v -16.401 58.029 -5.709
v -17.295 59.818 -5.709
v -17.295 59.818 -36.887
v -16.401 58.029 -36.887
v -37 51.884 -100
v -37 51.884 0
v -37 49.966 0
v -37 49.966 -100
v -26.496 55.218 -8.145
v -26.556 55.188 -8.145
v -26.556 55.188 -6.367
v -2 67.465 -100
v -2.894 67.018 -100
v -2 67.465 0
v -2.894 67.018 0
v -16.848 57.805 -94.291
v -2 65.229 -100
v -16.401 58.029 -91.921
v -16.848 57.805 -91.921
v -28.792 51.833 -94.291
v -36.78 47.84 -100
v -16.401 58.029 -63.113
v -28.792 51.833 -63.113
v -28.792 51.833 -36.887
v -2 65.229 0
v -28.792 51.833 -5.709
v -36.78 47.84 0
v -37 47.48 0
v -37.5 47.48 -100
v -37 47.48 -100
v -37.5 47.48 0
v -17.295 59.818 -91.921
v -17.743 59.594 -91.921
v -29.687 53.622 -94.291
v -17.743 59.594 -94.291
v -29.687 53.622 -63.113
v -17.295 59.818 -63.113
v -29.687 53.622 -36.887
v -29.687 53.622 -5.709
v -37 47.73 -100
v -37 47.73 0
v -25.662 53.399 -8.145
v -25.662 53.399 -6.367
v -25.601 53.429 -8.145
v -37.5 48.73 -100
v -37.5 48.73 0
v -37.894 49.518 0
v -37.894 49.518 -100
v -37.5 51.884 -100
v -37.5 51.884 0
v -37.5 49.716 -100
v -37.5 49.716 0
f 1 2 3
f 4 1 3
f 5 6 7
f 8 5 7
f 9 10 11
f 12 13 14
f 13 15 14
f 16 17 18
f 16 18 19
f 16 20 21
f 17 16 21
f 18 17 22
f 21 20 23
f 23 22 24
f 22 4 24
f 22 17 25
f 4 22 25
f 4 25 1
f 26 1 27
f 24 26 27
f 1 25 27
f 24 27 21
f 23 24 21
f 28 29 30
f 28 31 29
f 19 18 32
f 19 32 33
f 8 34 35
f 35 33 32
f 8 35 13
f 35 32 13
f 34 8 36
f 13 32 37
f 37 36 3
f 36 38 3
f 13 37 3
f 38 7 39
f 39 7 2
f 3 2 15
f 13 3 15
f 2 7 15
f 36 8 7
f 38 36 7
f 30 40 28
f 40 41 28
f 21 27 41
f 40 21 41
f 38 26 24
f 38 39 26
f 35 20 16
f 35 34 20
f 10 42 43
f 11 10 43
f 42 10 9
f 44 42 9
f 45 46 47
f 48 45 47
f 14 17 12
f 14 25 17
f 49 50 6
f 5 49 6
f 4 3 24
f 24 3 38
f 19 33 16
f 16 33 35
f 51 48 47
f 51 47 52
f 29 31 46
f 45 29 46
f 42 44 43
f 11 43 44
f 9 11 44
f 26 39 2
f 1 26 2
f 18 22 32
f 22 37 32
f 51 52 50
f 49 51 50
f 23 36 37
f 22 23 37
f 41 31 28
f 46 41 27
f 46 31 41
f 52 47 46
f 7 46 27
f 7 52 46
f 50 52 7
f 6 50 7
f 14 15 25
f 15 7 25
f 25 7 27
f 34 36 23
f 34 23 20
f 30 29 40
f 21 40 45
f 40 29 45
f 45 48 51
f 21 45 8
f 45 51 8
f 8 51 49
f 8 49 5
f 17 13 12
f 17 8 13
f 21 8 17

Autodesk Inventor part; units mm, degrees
ref_plane "YZ Plane" through (0, 0, 0) normal (1, 0, 0) x (0, 1, 0)
ref_plane "XZ Plane" through (0, 0, 0) normal (0, 1, 0) x (-1, 0, 0)
ref_plane "XY Plane" through (0, 0, 0) normal (0, 0, 1) x (1, 0, 0)
ref_plane "Work Plane1" through (0, 0, 0) normal (0, 0, 1) x (1, 0, 0)
sketch "Sketch1" plane through (0, 0, 0) normal (0, 0, 1) x (1, 0, 0)
  arc A0 (-37, -19.9971) -> (-36.2161, -20.9735) centre (-36, -19.9971) ccw projected
  line L0 (-36.2161, -20.9735) -> (-23.4006, -23.8092) projected
  arc A1 (-23.4006, -23.8092) -> (-22.2674, -22.4343) centre (-23.1845, -22.8329) ccw projected
  arc A2 (-15.124, -1.2705) -> (-22.2674, -22.4343) centre (-7, -15.8) ccw projected
  arc A3 (-2, 0) -> (-15.124, -1.2705) centre (-7, -16.7705) ccw projected
  line L1 (-2, 0) -> (-2, 61.9933) projected
  arc A4 (-2, 61.9933) -> (-4.8944, 63.7822) centre (-4, 61.9933) ccw projected
  line L2 (-5.7149, 25.9193) -> (-9.7149, 25.9193) projected
  line L3 (-9.7149, 25.9193) -> (-9.7149, 32.3193) projected
  line L4 (-9.7149, 32.3193) -> (-5.7149, 32.3193) projected
  line L5 (-5.7149, 32.3193) -> (-5.7149, 25.9193) projected
  line L6 (0, 0) -> (0, 66.5) projected
  line L7 (-2, 0) -> (-2, 66.5) projected
  line L8 (0, 0) -> (-2, 0) projected
  line L9 (-2, 65.2294) -> (-36.7798, 47.8397)
  line L10 (-2, 65.2294) -> (-2.8944, 67.0182)
  line L11 (-37, 24.9335) -> (-37.5, 24.9335)
  line L12 (-37.5, 24.9335) -> (-37.5, 47.4795)
  line L13 (-37.5, 47.4795) -> (-37, 47.4795)
  line L14 (-37, 47.4795) -> (-37, 24.9335)
  line L15 (-37, 47.4795) -> (-37.5, 47.4795)
  line L16 (-37.5, 47.4795) -> (-37.5, 51.8841)
  line L17 (-37.5, 51.8841) -> (-37, 51.8841)
  line L18 (-37, 51.8841) -> (-37, 47.4795)
  line L19 (-36.7798, 47.8397) -> (-39.9927, 46.2332)
  line L20 (-37, 47.7295) -> (-37.8944, 49.5184)
  line L21 (-37.8944, 49.5184) -> (-2.8944, 67.0182)
  line L22 (-37, 47.7295) -> (-37, 49.9656)
  line L23 (-2, 65.2294) -> (-2, 67.4654)
  line L24 (-2.8944, 67.0182) -> (-2, 67.4654)
  line L25 (-37, 46.6115) -> (-37, -19.9971) projected
  line L26 (0, 66.5) -> (-2, 66.5) projected
  line L27 (-4.8944, 63.7822) -> (-37, 46.6115) projected
  point P0 (-37, 47.0432)
  point P1 (-37.5, 49.7156)
  point P2 (-37.5, 48.7296)
  dimension "d0" = 2
  dimension "d1" = 0.5
  dimension "d2" = 2
extrude "Extrusion1" add sketch "Sketch1" against normal blind 100 contours L19 L18 L13 | L16 L20 L19 | L9 L19 L18 L21 L10 | L20 L21 L16 | L16 L21 L18 L20 | L10 L24 L23 L7 | L16 L17 L18 L21
sketch "Sketch2" plane through (-2, 67.4654, 0) normal (-0.4472, 0.8944, 0) x (0.8944, 0.4472, 0)
  line L0 (-21.6579, 7.5484) -> (-21.306, 16.8472) projected
  line L1 (-20.8996, 27.5881) -> (-20.5477, 36.8868) projected
  line L2 (-20.5477, 36.8868) -> (-23.0666, 36.8868) projected
  line L3 (-29.9704, 36.8868) -> (-32.4893, 36.8868) projected
  line L4 (-33.5995, 7.5484) -> (-32.4893, 36.8868) projected
  line L5 (-21.8658, 16.8472) -> (-22.195, 8.1452) projected
  line L6 (-21.306, 16.8472) -> (-21.8658, 16.8472) projected
  line L7 (-21.6579, 7.5484) -> (-21.306, 16.8472) projected
  line L8 (-21.6579, 7.5484) -> (-24.1768, 7.5484) projected
  line L9 (-24.1768, 7.5484) -> (-24.316, 3.8687) projected
  ellipse E0 centre (-27.7679, 3.8687) end of major axis (-28.8048, 0.317) minor radius 3.433 (-31.2198, 3.8687) -> (-24.316, 3.8687) ccw projected
  line L10 (-31.0806, 7.5484) -> (-31.2198, 3.8687) projected
  line L11 (-31.0806, 7.5484) -> (-33.5995, 7.5484) projected
  line L12 (-33.5995, 7.5484) -> (-32.4893, 36.8868) projected
  line L13 (-29.9704, 36.8868) -> (-32.4893, 36.8868) projected
  line L14 (-29.9704, 36.8868) -> (-29.8312, 40.5666) projected
  ellipse E1 centre (-26.3793, 40.5666) end of major axis (-27.4161, 37.0148) minor radius 3.433 (-22.9274, 40.5666) -> (-29.8312, 40.5666) ccw projected
  line L15 (-23.0666, 36.8868) -> (-22.9274, 40.5666) projected
  line L16 (-20.5477, 36.8868) -> (-23.0666, 36.8868) projected
  line L17 (-20.8996, 27.5881) -> (-20.5477, 36.8868) projected
  line L18 (-21.4593, 27.5881) -> (-20.8996, 27.5881) projected
  line L19 (-21.13, 36.2901) -> (-21.4593, 27.5881) projected
  line L20 (-31.9522, 36.2901) -> (-21.13, 36.2901) projected
  line L21 (-31.9522, 36.2901) -> (-33.0172, 8.1452) projected
  line L22 (-33.0172, 8.1452) -> (-22.195, 8.1452) projected
  ellipse E2 centre (-27.7698, 3.819) end of major axis (-28.2182, 2.2831) minor radius 1.4845 projected
  ellipse E3 centre (-26.3774, 40.6163) end of major axis (-26.8258, 39.0804) minor radius 1.4845 projected
  line L23 (-27.4544, 6.3673) -> (-26.3442, 35.7057) projected
  line L24 (-19.711, 6.3673) -> (-27.4544, 6.3673) projected
  line L25 (-18.6008, 35.7057) -> (-19.711, 6.3673) projected
  line L26 (-26.3442, 35.7057) -> (-18.6008, 35.7057) projected
  line L27 (-26.7698, 14.5969) -> (-27.052, 7.138) projected
  line L28 (-19.7727, 14.5969) -> (-26.7698, 14.5969) projected
  line L29 (-19.7727, 14.5969) -> (-20.055, 7.138) projected
  line L30 (-20.055, 7.138) -> (-27.052, 7.138) projected
  line L31 (-19.0031, 34.9349) -> (-26.0002, 34.9349) projected
  line L32 (-19.0031, 34.9349) -> (-19.6166, 18.7242) projected
  line L33 (-19.6166, 18.7242) -> (-26.6136, 18.7242) projected
  line L34 (-26.0002, 34.9349) -> (-26.6136, 18.7242) projected
  line L35 (-26.3442, 64.2943) -> (-27.4544, 93.6327) projected
  line L36 (-18.6008, 64.2943) -> (-26.3442, 64.2943) projected
  line L37 (-19.711, 93.6327) -> (-18.6008, 64.2943) projected
  line L38 (-27.4544, 93.6327) -> (-19.711, 93.6327) projected
  line L39 (-26.2824, 72.524) -> (-26.0002, 65.0651) projected
  line L40 (-19.2854, 72.524) -> (-26.2824, 72.524) projected
  line L41 (-19.2854, 72.524) -> (-19.0031, 65.0651) projected
  line L42 (-19.0031, 65.0651) -> (-26.0002, 65.0651) projected
  line L43 (-20.055, 92.862) -> (-27.052, 92.862) projected
  line L44 (-20.055, 92.862) -> (-19.4416, 76.6513) projected
  line L45 (-19.4416, 76.6513) -> (-26.4386, 76.6513) projected
  line L46 (-27.052, 92.862) -> (-26.4386, 76.6513) projected
  line L47 (-21.4593, 72.4119) -> (-21.13, 63.7099) projected
  line L48 (-20.8996, 72.4119) -> (-21.4593, 72.4119) projected
  line L49 (-20.5477, 63.1132) -> (-20.8996, 72.4119) projected
  line L50 (-20.5477, 63.1132) -> (-23.0666, 63.1132) projected
  line L51 (-23.0666, 63.1132) -> (-22.9274, 59.4334) projected
  ellipse E4 centre (-26.3793, 59.4334) end of major axis (-25.3424, 55.8817) minor radius 3.433 (-29.8312, 59.4334) -> (-22.9274, 59.4334) ccw projected
  line L52 (-29.9704, 63.1132) -> (-29.8312, 59.4334) projected
  line L53 (-29.9704, 63.1132) -> (-32.4893, 63.1132) projected
  line L54 (-32.4893, 63.1132) -> (-33.5995, 92.4516) projected
  line L55 (-31.0806, 92.4516) -> (-33.5995, 92.4516) projected
  line L56 (-31.0806, 92.4516) -> (-31.2198, 96.1313) projected
  ellipse E5 centre (-27.7679, 96.1313) end of major axis (-26.7311, 92.5795) minor radius 3.433 (-24.316, 96.1313) -> (-31.2198, 96.1313) ccw projected
  line L57 (-24.1768, 92.4516) -> (-24.316, 96.1313) projected
  line L58 (-21.6579, 92.4516) -> (-24.1768, 92.4516) projected
  line L59 (-21.306, 83.1528) -> (-21.6579, 92.4516) projected
  line L60 (-21.8658, 83.1528) -> (-21.306, 83.1528) projected
  line L61 (-22.195, 91.8548) -> (-21.8658, 83.1528) projected
  line L62 (-33.0172, 91.8548) -> (-22.195, 91.8548) projected
  line L63 (-33.0172, 91.8548) -> (-31.9522, 63.7099) projected
  line L64 (-31.9522, 63.7099) -> (-21.13, 63.7099) projected
  ellipse E6 centre (-26.3774, 59.3837) end of major axis (-25.929, 57.8478) minor radius 1.4845 projected
  ellipse E7 centre (-27.7698, 96.181) end of major axis (-27.3214, 94.6451) minor radius 1.4845 projected
  line L65 (-18.6008, 35.7057) -> (-27.4544, 35.7057)
  line L66 (-27.4544, 35.7057) -> (-27.4544, 6.3673)
  line L67 (-27.4544, 6.3673) -> (-18.6008, 6.3673)
  line L68 (-18.6008, 6.3673) -> (-18.6008, 35.7057)
  line L69 (-27.4544, 6.3673) -> (-28.4544, 6.3673)
  line L70 (-28.4544, 6.3673) -> (-28.4544, 5.7086)
  line L71 (-28.4544, 5.7086) -> (-27.4544, 5.7086)
  line L72 (-27.4544, 5.7086) -> (-27.4544, 6.3673)
  line L73 (-18.6008, 35.7057) -> (-17.6008, 35.7057)
  line L74 (-17.6008, 35.7057) -> (-17.6008, 36.8868)
  line L75 (-17.6008, 36.8868) -> (-18.6008, 36.8868)
  line L76 (-18.6008, 36.8868) -> (-18.6008, 35.7057)
  line L77 (-17.6008, 36.8868) -> (-28.4544, 36.8868)
  line L78 (-28.4544, 36.8868) -> (-28.4544, 5.7086)
  line L79 (-28.4544, 5.7086) -> (-17.6008, 5.7086)
  line L80 (-17.6008, 5.7086) -> (-17.6008, 36.8868)
  point P0 (-28.3824, 0)
  point P1 (-27.4544, 8.1452)
  point P2 (-27.3871, 8.1452)
  point P3 (-28.4544, 6.3673)
  point P4 (-27.4544, 5.7086)
  point P5 (-17.6008, 35.7057)
  point P6 (-18.6008, 36.8868)
  dimension "d5" = 1
  dimension "d6" = 1
extrude "Extrusion2" cut sketch "Sketch2" against normal blind 3 contours L8 L9 L30 L27 L22 L5 L28 L0 | L0 L28 L29 L30 L9 L8 | L28 L5 L6 L0 | L0 L6 L5 L28 L27 L22 L23 L26 L19 L31 L34 L33 L32 L1 L25 L24 L9 L30 L29 | L5 L22 L27 L28 | L9 L24 L23 L22 L27 L30 | L24 L67 L68 L73 L80 L79 L9 | L9 L79 L72 L24 | L25 L68 L67 | L69 L78 L22 L66 | L72 L71 L70 L69 | L22 L66 L65 L23 | L76 L75 L74 L73 | L26 L1 L77 L76 | L22 L78 L20 L19 L26 L65 L66 | L26 L19 L20 L78 L77 L2 L1 | L1 L31 L19 L26 | L31 L32 L33 L34 L19 L18 L1 | L1 L18 L19 L31
sketch "Sketch3" plane through (-2, 67.4654, 0) normal (-0.4472, 0.8944, 0) x (0.8944, 0.4472, 0)
  line L0 (0, 0) -> (-39.1311, 0) projected
  line L1 (0, 0) -> (0, 100) projected
  line L2 (-39.1311, 100) -> (0, 100) projected
  line L3 (-39.1311, 0) -> (-39.1311, 100) projected
  line L4 (-17.6008, 36.8868) -> (-17.6008, 5.7086) projected
  line L5 (-17.6008, 5.7086) -> (-28.4544, 5.7086) projected
  line L6 (-28.4544, 5.7086) -> (-28.4544, 36.8868) projected
  line L7 (-28.4544, 36.8868) -> (-17.6008, 36.8868) projected
  line L8 (-28.4544, 36.8868) -> (-28.4544, 5.7086) projected
  line L9 (-28.4544, 5.7086) -> (-29.4544, 5.7086)
  line L10 (-29.4544, 5.7086) -> (-29.4544, 36.8868)
  line L11 (-29.4544, 36.8868) -> (-28.4544, 36.8868)
  line L12 (-28.4544, 36.8868) -> (-28.4544, 5.7086)
  line L13 (-28.4544, 36.8868) -> (-29.9544, 36.8868)
  line L14 (-29.9544, 36.8868) -> (-29.9544, 5.7086)
  line L15 (-29.9544, 5.7086) -> (-28.4544, 5.7086)
  line L16 (-28.4544, 5.7086) -> (-28.4544, 36.8868)
  line L17 (-39.1311, 0) -> (-39.1311, 100) projected
  line L18 (-39.1311, 50) -> (0, 50)
  line L19 (0, 0) -> (0, 100) projected
  line L20 (-17.6008, 63.1132) -> (-17.6008, 94.2914)
  line L21 (-17.6008, 94.2914) -> (-28.4544, 94.2914)
  line L22 (-28.4544, 63.1132) -> (-17.6008, 63.1132)
  line L23 (-29.4544, 63.1132) -> (-28.4544, 63.1132)
  line L24 (-28.4544, 63.1132) -> (-29.9544, 63.1132)
  line L25 (-29.9544, 63.1132) -> (-29.9544, 94.2914)
  line L26 (-29.9544, 94.2914) -> (-28.4544, 94.2914)
  point P0 (-28.3824, 0)
  point P1 (-28.4544, 94.2914)
  point P2 (-29.4544, 5.7086)
  point P3 (-28.4544, 36.8868)
  dimension "d9" = 1
  dimension "d10" = 1.5
extrude "Extrusion3" cut sketch "Sketch3" against normal blind 3 contours L6 L9 L10 L11 | L10 L15 L14 L13 | L22 L23 L24 L25 L26 L21 L20
sketch "Sketch4" plane through (-2, 67.4654, 0) normal (-0.4472, 0.8944, 0) x (0.8944, 0.4472, 0)
  line L0 (-17.6008, 5.7086) -> (-29.9544, 5.7086) projected
  line L1 (-29.9544, 5.7086) -> (-29.9544, 36.8868) projected
  line L2 (-29.9544, 36.8868) -> (-17.6008, 36.8868) projected
  line L3 (-17.6008, 36.8868) -> (-17.6008, 5.7086) projected
  line L4 (0, 0) -> (-39.1311, 0) projected
  line L5 (0, 0) -> (0, 100) projected
  line L6 (-39.1311, 100) -> (0, 100) projected
  line L7 (-39.1311, 0) -> (-39.1311, 100) projected
  line L8 (-29.9544, 94.2914) -> (-17.6008, 94.2914) projected
  line L9 (-17.6008, 94.2914) -> (-17.6008, 63.1132) projected
  line L10 (-17.6008, 63.1132) -> (-29.9544, 63.1132) projected
  line L11 (-29.9544, 63.1132) -> (-29.9544, 94.2914) projected
  line L12 (-17.6008, 5.7086) -> (-29.9544, 5.7086) projected
  line L13 (-29.9544, 5.7086) -> (-30.9544, 5.7086)
  line L14 (-30.9544, 5.7086) -> (-30.9544, 36.8868)
  line L15 (-30.9544, 36.8868) -> (-29.9544, 36.8868)
  line L16 (-29.9544, 36.8868) -> (-29.9544, 5.7086)
  line L17 (-29.9544, 94.2914) -> (-29.9544, 63.1132) projected
  line L18 (-29.9544, 63.1132) -> (-30.9544, 63.1132)
  line L19 (-30.9544, 63.1132) -> (-30.9544, 94.2914)
  line L20 (-30.9544, 94.2914) -> (-29.9544, 94.2914)
  line L21 (-29.9544, 94.2914) -> (-29.9544, 63.1132)
  point P0 (-28.3824, 0)
  point P1 (-29.9544, 94.2914)
  point P2 (-29.9544, 36.8868)
  dimension "d13" = 1
extrude "Extrusion4" cut sketch "Sketch4" against normal blind 3 contours L13 L14 L15 L1 | L11 L18 L19 L20
sketch "Sketch5" plane through (-2, 67.4654, 0) normal (-0.4472, 0.8944, 0) x (0.8944, 0.4472, 0)
  ellipse E0 centre (-26.3793, 40.5666) end of major axis (-27.4161, 37.0148) minor radius 3.433 (-22.9274, 40.5666) -> (-29.8312, 40.5666) ccw projected
  line L0 (-30.9544, 94.2914) -> (-17.6008, 94.2914) projected
  line L1 (-17.6008, 94.2914) -> (-17.6008, 63.1132) projected
  line L2 (-17.6008, 63.1132) -> (-30.9544, 63.1132) projected
  line L3 (-30.9544, 63.1132) -> (-30.9544, 94.2914) projected
  line L4 (-30.9544, 36.8868) -> (-17.6008, 36.8868) projected
  line L5 (-17.6008, 36.8868) -> (-17.6008, 5.7086) projected
  line L6 (-17.6008, 5.7086) -> (-30.9544, 5.7086) projected
  line L7 (-30.9544, 5.7086) -> (-30.9544, 36.8868) projected
  line L8 (0, 0) -> (-39.1311, 0) projected
  line L9 (0, 0) -> (0, 100) projected
  line L10 (-39.1311, 100) -> (0, 100) projected
  line L11 (-39.1311, 0) -> (-39.1311, 100) projected
  line L12 (-17.6008, 5.7086) -> (-17.1008, 5.7086)
  line L13 (-17.1008, 5.7086) -> (-17.1008, 36.8868)
  line L14 (-17.1008, 36.8868) -> (-17.6008, 36.8868)
  line L15 (-17.6008, 36.8868) -> (-17.6008, 5.7086)
  line L16 (-17.6008, 63.1132) -> (-30.9544, 63.1132) projected
  line L17 (-17.6008, 63.1132) -> (-17.1008, 63.1132)
  line L18 (-17.1008, 63.1132) -> (-17.1008, 91.9206)
  line L19 (-17.1008, 91.9206) -> (-17.6008, 91.9206)
  line L20 (-17.6008, 91.9206) -> (-17.6008, 63.1132)
  point P0 (-28.3824, 0)
  point P1 (-17.6008, 91.9206)
  point P2 (-17.6008, 36.8868)
  dimension "d16" = 0.5
  dimension "d17" = 0.5
extrude "Extrusion5" cut sketch "Sketch5" against normal blind 3 contours L19 L18 L17 L1 | L14 L13 L12 L5
properties part number "pług_v2"
